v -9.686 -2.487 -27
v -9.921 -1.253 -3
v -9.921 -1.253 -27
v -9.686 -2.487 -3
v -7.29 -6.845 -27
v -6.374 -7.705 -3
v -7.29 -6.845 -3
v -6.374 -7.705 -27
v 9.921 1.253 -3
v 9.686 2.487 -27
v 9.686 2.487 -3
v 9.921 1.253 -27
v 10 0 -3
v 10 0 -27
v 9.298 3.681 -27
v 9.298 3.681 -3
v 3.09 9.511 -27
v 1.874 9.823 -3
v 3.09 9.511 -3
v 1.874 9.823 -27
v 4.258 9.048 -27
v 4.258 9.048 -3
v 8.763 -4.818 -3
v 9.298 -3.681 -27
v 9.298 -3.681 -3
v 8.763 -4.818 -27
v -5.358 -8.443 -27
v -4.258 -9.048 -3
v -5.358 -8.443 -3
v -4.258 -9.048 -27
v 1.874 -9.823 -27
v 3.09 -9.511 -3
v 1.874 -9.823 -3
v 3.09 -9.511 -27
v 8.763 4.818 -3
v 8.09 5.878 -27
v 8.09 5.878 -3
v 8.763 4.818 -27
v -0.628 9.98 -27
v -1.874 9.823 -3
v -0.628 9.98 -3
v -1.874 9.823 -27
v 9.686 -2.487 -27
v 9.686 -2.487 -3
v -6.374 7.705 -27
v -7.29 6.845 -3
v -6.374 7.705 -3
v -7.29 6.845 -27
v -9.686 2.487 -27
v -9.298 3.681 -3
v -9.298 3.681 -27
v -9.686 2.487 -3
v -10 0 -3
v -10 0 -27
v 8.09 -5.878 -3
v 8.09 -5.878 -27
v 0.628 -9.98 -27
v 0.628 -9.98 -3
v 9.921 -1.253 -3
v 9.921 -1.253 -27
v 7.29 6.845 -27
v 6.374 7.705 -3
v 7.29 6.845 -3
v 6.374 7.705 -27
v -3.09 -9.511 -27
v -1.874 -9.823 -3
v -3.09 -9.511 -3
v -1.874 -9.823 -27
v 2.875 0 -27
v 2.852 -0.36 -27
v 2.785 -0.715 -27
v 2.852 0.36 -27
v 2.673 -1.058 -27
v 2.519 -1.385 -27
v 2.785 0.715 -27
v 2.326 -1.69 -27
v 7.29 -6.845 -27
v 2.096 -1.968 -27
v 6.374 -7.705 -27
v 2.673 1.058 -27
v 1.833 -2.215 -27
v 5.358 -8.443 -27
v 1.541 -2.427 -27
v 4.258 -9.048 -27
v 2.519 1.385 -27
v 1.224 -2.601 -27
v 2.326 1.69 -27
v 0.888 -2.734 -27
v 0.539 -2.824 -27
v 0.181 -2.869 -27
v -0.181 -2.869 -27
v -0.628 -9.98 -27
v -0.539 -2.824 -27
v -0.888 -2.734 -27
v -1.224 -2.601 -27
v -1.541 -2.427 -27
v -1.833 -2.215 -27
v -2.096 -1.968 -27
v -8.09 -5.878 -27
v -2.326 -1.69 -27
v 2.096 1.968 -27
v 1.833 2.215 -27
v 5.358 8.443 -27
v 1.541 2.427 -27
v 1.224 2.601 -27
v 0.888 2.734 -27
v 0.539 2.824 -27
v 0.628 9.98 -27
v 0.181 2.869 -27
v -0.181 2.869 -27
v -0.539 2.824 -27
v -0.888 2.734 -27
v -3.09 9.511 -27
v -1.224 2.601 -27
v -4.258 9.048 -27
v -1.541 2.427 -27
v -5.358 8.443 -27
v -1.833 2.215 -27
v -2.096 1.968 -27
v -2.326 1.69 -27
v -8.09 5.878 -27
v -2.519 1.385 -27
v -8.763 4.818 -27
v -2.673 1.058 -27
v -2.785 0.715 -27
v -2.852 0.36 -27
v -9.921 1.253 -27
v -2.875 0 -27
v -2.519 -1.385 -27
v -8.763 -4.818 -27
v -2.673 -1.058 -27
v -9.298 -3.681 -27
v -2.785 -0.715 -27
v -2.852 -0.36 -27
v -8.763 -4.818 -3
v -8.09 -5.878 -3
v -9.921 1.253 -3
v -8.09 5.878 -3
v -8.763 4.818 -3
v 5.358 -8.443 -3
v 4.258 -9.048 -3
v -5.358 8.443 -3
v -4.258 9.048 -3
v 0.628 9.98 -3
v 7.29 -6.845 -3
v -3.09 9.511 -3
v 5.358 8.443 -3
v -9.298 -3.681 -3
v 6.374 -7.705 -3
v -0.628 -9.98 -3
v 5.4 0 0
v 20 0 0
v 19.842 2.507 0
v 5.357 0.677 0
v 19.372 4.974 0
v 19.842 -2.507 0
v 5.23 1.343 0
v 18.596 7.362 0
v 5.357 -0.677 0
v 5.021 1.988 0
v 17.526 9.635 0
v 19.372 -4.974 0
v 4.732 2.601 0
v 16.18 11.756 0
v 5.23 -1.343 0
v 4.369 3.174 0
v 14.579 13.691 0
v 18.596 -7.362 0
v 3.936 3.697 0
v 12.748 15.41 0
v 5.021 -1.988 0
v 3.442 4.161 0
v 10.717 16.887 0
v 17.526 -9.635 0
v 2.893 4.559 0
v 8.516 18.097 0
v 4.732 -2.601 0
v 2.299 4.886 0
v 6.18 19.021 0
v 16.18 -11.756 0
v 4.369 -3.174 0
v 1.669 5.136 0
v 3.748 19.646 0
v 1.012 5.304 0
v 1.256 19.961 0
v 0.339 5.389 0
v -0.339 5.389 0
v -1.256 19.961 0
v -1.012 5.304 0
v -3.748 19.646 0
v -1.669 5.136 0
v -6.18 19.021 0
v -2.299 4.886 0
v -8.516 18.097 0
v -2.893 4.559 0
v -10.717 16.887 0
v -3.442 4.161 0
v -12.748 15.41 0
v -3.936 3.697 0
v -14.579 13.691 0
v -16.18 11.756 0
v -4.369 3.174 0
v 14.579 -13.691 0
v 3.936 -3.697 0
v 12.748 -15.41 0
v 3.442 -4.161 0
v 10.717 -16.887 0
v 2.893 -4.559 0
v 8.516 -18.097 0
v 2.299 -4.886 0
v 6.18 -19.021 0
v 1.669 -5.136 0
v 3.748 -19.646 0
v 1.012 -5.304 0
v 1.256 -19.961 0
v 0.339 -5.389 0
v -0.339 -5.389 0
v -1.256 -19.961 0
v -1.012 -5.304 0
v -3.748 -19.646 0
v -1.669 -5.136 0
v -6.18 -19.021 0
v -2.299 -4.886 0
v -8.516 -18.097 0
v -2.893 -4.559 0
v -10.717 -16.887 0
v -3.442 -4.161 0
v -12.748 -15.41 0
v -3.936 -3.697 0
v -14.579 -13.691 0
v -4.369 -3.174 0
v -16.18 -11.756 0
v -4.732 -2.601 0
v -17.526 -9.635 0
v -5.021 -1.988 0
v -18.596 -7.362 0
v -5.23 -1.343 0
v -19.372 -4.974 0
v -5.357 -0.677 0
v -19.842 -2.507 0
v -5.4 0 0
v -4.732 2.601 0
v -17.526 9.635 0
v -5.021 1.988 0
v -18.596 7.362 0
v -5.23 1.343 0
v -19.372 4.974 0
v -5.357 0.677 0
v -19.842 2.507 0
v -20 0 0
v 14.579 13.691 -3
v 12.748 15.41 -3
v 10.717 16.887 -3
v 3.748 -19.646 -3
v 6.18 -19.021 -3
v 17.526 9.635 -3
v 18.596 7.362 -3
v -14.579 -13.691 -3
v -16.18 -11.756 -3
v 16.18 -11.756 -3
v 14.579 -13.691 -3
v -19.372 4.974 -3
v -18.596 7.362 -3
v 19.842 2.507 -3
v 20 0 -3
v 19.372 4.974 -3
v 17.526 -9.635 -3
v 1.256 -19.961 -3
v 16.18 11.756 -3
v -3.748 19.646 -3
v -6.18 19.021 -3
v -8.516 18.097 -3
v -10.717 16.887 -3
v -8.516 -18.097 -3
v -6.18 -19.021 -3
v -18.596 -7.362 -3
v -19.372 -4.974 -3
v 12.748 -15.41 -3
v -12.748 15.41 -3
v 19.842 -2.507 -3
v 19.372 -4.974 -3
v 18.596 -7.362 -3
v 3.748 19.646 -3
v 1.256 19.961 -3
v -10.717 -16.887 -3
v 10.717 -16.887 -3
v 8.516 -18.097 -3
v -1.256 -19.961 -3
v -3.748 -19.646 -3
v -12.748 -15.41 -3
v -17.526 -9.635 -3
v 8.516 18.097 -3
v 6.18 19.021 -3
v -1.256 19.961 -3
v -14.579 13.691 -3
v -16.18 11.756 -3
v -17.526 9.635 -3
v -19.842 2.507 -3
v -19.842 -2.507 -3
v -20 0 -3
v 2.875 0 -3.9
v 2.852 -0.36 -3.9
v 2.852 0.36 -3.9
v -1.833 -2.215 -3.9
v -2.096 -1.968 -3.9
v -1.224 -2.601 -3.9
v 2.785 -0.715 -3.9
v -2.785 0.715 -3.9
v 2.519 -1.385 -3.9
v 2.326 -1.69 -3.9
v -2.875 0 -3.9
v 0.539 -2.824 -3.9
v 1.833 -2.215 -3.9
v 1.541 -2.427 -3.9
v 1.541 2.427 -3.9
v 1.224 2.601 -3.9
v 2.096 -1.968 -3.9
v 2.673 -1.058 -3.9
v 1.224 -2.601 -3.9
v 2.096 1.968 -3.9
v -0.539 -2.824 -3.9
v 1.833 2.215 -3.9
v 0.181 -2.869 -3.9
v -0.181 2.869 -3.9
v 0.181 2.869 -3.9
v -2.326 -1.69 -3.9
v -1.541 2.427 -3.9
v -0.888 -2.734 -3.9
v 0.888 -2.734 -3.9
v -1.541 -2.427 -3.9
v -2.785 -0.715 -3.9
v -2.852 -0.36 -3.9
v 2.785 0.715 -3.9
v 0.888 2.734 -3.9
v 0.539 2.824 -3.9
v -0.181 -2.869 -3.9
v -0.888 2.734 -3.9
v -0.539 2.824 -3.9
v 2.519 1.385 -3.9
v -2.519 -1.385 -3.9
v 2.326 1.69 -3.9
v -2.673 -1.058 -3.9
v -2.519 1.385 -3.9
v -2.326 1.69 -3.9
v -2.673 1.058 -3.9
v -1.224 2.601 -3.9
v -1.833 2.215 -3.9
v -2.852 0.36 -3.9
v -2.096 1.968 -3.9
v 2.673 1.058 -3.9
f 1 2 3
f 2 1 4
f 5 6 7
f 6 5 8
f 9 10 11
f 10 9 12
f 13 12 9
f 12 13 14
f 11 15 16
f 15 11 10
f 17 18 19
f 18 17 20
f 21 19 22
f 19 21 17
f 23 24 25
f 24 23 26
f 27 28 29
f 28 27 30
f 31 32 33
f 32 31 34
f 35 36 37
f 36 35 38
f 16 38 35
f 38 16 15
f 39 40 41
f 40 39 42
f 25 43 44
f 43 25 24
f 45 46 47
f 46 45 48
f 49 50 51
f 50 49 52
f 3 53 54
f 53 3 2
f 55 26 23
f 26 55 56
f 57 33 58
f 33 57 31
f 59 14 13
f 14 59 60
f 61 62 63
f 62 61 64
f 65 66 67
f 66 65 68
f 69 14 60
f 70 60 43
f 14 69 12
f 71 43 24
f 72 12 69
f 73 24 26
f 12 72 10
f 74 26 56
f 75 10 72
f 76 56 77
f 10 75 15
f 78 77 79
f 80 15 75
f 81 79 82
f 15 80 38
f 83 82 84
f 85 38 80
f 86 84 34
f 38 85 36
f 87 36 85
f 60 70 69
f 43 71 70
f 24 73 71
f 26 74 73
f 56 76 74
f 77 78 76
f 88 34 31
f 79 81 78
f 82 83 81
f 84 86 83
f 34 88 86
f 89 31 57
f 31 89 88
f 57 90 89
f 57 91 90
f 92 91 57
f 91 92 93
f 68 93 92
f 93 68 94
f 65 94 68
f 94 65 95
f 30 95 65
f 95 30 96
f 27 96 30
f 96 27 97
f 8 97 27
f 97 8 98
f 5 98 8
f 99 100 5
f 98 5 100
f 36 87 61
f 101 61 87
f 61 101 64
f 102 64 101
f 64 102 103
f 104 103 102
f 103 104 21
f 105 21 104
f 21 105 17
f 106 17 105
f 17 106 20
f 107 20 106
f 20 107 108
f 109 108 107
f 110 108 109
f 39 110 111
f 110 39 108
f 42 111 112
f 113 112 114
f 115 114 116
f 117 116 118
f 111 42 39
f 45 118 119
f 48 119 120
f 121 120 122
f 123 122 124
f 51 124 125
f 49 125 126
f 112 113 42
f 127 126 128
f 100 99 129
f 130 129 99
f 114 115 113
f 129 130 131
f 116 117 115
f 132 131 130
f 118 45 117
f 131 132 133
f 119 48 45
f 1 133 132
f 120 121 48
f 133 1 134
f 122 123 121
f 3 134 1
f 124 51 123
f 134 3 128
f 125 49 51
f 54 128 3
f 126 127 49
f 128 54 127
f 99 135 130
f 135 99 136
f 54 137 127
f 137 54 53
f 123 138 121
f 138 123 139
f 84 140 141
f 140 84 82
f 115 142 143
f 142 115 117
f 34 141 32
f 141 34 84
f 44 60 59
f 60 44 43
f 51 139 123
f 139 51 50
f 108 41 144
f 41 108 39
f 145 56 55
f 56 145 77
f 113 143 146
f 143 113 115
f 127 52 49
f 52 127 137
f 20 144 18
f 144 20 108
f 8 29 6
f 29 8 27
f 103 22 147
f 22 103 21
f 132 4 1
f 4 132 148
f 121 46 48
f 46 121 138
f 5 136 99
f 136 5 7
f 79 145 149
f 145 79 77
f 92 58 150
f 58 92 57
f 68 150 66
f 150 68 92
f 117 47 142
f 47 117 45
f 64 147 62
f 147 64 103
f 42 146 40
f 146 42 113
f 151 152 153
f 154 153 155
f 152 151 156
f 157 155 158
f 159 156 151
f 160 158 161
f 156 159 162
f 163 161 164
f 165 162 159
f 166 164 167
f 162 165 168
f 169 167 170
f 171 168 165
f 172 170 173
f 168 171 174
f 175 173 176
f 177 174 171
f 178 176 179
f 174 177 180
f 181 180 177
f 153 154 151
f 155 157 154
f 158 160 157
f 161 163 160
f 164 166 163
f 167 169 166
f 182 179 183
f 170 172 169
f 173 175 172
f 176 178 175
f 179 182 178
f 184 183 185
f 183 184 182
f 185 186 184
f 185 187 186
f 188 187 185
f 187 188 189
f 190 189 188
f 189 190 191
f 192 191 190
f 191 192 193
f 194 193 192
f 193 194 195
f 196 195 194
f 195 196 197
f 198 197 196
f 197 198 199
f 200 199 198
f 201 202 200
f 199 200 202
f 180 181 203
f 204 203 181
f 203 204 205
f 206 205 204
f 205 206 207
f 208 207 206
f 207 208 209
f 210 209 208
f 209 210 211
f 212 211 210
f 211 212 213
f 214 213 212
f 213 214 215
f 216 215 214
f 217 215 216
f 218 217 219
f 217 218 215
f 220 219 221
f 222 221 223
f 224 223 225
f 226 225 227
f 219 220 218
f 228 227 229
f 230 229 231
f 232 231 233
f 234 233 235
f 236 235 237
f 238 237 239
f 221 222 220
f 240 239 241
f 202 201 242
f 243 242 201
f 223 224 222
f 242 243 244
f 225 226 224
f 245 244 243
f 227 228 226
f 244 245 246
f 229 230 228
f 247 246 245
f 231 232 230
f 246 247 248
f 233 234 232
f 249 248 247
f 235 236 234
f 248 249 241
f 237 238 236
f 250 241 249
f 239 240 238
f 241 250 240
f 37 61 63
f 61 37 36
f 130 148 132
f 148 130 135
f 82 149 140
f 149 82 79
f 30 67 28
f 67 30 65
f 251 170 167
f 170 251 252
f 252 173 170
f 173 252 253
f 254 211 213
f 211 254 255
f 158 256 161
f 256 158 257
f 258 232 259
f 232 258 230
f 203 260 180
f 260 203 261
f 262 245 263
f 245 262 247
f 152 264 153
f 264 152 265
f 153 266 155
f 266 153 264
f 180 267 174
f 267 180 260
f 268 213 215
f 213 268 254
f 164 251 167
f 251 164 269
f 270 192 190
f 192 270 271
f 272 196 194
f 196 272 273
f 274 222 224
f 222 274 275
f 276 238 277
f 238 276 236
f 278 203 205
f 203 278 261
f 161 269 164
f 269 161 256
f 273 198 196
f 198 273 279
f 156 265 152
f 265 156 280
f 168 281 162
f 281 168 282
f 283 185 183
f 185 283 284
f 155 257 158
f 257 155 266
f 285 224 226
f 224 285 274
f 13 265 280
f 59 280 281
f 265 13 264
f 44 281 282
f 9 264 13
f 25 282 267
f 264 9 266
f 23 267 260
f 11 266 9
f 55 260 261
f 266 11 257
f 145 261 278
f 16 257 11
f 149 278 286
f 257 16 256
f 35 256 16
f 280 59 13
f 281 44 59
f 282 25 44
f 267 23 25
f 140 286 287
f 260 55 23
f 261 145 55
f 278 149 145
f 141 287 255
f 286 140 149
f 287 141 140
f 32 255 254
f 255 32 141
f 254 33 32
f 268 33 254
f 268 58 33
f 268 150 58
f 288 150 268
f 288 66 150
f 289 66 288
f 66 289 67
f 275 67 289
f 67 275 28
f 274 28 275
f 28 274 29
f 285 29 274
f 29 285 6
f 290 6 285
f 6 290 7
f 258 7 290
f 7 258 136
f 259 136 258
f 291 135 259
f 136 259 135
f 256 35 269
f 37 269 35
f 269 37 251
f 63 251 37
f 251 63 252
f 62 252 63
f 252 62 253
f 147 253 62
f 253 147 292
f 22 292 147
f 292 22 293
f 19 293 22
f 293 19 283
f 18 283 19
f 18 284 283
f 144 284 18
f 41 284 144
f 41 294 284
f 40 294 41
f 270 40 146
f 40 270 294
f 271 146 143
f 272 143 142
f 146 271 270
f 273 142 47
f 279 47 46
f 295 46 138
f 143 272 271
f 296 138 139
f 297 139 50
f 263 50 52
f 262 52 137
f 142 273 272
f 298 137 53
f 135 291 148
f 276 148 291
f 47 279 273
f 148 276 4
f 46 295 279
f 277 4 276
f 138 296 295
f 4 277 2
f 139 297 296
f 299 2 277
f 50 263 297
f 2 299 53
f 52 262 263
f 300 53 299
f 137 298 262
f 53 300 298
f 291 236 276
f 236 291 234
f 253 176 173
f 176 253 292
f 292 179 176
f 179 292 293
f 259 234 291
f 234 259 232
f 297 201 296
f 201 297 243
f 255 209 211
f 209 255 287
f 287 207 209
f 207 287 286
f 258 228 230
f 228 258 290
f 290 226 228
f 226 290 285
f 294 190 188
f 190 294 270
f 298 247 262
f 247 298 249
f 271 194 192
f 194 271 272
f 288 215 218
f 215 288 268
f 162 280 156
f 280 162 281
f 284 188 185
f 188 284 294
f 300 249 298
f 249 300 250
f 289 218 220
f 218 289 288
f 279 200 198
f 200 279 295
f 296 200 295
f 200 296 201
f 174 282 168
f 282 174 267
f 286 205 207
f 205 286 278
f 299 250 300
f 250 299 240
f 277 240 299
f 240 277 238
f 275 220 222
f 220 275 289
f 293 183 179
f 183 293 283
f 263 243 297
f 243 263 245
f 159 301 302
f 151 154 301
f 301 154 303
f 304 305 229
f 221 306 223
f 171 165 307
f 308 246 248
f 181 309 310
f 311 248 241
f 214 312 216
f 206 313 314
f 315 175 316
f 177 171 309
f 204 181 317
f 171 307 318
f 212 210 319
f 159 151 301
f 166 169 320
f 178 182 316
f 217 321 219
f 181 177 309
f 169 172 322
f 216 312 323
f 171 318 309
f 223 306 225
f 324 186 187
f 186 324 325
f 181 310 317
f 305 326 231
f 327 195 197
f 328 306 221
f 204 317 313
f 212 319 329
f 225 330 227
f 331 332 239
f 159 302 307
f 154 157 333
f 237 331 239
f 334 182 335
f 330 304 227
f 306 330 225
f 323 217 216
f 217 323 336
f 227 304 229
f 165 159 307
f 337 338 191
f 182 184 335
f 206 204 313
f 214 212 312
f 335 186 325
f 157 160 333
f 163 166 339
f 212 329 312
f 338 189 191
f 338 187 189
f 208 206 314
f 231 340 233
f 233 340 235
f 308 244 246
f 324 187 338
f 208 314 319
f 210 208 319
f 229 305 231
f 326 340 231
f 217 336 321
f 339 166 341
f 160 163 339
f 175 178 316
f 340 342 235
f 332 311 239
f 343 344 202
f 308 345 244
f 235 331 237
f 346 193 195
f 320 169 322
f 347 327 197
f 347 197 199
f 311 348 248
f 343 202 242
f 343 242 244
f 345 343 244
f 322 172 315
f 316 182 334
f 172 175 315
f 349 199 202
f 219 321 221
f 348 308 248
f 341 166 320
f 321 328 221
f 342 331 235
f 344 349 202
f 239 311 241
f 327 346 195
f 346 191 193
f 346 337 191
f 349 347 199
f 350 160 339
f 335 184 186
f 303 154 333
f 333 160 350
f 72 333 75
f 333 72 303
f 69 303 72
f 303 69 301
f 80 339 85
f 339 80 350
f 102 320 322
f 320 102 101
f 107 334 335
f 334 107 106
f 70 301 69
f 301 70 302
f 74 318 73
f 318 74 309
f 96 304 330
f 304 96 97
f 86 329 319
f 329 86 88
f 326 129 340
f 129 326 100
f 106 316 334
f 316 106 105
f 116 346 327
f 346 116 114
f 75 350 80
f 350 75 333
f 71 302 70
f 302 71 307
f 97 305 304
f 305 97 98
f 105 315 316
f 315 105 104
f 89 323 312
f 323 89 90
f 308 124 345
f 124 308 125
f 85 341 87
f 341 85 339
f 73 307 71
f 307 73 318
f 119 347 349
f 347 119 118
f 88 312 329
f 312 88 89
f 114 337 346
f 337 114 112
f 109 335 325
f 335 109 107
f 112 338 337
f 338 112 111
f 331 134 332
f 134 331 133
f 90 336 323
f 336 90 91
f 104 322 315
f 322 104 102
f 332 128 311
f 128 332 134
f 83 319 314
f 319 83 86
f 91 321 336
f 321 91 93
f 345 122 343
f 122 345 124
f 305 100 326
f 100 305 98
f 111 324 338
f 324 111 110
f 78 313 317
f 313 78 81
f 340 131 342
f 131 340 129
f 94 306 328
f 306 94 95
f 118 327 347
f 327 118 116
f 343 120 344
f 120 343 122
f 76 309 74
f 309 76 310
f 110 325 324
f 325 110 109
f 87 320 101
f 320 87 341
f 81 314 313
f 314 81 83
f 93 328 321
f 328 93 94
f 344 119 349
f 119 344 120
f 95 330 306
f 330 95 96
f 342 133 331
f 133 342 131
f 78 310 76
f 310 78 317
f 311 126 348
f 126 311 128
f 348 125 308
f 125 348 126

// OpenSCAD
$fn = 50;


difference() {
	union() {
		translate(v = [0, 0, -27.0000000000]) {
			cylinder(h = 27, r = 10.0000000000);
		}
		translate(v = [0, 0, -3.0000000000]) {
			cylinder(h = 3, r = 20.0000000000);
		}
	}
	union() {
		translate(v = [0, 0, 0]) {
			rotate(a = [0, 0, 0]) {
				difference() {
					union() {
						#translate(v = [0, 0, -27.0000000000]) {
							cylinder(h = 27, r = 2.6000000000);
						}
						#translate(v = [0, 0, -3.9000000000]) {
							cylinder(h = 3.9000000000, r = 10.0000000000, r1 = 2.8750000000, r2 = 5.4000000000);
						}
						#translate(v = [0, 0, -27.0000000000]) {
							cylinder(h = 27, r = 2.8750000000);
						}
						#translate(v = [0, 0, -27.0000000000]) {
							cylinder(h = 27, r = 2.6000000000);
						}
					}
					union();
				}
			}
		}
	}
}
